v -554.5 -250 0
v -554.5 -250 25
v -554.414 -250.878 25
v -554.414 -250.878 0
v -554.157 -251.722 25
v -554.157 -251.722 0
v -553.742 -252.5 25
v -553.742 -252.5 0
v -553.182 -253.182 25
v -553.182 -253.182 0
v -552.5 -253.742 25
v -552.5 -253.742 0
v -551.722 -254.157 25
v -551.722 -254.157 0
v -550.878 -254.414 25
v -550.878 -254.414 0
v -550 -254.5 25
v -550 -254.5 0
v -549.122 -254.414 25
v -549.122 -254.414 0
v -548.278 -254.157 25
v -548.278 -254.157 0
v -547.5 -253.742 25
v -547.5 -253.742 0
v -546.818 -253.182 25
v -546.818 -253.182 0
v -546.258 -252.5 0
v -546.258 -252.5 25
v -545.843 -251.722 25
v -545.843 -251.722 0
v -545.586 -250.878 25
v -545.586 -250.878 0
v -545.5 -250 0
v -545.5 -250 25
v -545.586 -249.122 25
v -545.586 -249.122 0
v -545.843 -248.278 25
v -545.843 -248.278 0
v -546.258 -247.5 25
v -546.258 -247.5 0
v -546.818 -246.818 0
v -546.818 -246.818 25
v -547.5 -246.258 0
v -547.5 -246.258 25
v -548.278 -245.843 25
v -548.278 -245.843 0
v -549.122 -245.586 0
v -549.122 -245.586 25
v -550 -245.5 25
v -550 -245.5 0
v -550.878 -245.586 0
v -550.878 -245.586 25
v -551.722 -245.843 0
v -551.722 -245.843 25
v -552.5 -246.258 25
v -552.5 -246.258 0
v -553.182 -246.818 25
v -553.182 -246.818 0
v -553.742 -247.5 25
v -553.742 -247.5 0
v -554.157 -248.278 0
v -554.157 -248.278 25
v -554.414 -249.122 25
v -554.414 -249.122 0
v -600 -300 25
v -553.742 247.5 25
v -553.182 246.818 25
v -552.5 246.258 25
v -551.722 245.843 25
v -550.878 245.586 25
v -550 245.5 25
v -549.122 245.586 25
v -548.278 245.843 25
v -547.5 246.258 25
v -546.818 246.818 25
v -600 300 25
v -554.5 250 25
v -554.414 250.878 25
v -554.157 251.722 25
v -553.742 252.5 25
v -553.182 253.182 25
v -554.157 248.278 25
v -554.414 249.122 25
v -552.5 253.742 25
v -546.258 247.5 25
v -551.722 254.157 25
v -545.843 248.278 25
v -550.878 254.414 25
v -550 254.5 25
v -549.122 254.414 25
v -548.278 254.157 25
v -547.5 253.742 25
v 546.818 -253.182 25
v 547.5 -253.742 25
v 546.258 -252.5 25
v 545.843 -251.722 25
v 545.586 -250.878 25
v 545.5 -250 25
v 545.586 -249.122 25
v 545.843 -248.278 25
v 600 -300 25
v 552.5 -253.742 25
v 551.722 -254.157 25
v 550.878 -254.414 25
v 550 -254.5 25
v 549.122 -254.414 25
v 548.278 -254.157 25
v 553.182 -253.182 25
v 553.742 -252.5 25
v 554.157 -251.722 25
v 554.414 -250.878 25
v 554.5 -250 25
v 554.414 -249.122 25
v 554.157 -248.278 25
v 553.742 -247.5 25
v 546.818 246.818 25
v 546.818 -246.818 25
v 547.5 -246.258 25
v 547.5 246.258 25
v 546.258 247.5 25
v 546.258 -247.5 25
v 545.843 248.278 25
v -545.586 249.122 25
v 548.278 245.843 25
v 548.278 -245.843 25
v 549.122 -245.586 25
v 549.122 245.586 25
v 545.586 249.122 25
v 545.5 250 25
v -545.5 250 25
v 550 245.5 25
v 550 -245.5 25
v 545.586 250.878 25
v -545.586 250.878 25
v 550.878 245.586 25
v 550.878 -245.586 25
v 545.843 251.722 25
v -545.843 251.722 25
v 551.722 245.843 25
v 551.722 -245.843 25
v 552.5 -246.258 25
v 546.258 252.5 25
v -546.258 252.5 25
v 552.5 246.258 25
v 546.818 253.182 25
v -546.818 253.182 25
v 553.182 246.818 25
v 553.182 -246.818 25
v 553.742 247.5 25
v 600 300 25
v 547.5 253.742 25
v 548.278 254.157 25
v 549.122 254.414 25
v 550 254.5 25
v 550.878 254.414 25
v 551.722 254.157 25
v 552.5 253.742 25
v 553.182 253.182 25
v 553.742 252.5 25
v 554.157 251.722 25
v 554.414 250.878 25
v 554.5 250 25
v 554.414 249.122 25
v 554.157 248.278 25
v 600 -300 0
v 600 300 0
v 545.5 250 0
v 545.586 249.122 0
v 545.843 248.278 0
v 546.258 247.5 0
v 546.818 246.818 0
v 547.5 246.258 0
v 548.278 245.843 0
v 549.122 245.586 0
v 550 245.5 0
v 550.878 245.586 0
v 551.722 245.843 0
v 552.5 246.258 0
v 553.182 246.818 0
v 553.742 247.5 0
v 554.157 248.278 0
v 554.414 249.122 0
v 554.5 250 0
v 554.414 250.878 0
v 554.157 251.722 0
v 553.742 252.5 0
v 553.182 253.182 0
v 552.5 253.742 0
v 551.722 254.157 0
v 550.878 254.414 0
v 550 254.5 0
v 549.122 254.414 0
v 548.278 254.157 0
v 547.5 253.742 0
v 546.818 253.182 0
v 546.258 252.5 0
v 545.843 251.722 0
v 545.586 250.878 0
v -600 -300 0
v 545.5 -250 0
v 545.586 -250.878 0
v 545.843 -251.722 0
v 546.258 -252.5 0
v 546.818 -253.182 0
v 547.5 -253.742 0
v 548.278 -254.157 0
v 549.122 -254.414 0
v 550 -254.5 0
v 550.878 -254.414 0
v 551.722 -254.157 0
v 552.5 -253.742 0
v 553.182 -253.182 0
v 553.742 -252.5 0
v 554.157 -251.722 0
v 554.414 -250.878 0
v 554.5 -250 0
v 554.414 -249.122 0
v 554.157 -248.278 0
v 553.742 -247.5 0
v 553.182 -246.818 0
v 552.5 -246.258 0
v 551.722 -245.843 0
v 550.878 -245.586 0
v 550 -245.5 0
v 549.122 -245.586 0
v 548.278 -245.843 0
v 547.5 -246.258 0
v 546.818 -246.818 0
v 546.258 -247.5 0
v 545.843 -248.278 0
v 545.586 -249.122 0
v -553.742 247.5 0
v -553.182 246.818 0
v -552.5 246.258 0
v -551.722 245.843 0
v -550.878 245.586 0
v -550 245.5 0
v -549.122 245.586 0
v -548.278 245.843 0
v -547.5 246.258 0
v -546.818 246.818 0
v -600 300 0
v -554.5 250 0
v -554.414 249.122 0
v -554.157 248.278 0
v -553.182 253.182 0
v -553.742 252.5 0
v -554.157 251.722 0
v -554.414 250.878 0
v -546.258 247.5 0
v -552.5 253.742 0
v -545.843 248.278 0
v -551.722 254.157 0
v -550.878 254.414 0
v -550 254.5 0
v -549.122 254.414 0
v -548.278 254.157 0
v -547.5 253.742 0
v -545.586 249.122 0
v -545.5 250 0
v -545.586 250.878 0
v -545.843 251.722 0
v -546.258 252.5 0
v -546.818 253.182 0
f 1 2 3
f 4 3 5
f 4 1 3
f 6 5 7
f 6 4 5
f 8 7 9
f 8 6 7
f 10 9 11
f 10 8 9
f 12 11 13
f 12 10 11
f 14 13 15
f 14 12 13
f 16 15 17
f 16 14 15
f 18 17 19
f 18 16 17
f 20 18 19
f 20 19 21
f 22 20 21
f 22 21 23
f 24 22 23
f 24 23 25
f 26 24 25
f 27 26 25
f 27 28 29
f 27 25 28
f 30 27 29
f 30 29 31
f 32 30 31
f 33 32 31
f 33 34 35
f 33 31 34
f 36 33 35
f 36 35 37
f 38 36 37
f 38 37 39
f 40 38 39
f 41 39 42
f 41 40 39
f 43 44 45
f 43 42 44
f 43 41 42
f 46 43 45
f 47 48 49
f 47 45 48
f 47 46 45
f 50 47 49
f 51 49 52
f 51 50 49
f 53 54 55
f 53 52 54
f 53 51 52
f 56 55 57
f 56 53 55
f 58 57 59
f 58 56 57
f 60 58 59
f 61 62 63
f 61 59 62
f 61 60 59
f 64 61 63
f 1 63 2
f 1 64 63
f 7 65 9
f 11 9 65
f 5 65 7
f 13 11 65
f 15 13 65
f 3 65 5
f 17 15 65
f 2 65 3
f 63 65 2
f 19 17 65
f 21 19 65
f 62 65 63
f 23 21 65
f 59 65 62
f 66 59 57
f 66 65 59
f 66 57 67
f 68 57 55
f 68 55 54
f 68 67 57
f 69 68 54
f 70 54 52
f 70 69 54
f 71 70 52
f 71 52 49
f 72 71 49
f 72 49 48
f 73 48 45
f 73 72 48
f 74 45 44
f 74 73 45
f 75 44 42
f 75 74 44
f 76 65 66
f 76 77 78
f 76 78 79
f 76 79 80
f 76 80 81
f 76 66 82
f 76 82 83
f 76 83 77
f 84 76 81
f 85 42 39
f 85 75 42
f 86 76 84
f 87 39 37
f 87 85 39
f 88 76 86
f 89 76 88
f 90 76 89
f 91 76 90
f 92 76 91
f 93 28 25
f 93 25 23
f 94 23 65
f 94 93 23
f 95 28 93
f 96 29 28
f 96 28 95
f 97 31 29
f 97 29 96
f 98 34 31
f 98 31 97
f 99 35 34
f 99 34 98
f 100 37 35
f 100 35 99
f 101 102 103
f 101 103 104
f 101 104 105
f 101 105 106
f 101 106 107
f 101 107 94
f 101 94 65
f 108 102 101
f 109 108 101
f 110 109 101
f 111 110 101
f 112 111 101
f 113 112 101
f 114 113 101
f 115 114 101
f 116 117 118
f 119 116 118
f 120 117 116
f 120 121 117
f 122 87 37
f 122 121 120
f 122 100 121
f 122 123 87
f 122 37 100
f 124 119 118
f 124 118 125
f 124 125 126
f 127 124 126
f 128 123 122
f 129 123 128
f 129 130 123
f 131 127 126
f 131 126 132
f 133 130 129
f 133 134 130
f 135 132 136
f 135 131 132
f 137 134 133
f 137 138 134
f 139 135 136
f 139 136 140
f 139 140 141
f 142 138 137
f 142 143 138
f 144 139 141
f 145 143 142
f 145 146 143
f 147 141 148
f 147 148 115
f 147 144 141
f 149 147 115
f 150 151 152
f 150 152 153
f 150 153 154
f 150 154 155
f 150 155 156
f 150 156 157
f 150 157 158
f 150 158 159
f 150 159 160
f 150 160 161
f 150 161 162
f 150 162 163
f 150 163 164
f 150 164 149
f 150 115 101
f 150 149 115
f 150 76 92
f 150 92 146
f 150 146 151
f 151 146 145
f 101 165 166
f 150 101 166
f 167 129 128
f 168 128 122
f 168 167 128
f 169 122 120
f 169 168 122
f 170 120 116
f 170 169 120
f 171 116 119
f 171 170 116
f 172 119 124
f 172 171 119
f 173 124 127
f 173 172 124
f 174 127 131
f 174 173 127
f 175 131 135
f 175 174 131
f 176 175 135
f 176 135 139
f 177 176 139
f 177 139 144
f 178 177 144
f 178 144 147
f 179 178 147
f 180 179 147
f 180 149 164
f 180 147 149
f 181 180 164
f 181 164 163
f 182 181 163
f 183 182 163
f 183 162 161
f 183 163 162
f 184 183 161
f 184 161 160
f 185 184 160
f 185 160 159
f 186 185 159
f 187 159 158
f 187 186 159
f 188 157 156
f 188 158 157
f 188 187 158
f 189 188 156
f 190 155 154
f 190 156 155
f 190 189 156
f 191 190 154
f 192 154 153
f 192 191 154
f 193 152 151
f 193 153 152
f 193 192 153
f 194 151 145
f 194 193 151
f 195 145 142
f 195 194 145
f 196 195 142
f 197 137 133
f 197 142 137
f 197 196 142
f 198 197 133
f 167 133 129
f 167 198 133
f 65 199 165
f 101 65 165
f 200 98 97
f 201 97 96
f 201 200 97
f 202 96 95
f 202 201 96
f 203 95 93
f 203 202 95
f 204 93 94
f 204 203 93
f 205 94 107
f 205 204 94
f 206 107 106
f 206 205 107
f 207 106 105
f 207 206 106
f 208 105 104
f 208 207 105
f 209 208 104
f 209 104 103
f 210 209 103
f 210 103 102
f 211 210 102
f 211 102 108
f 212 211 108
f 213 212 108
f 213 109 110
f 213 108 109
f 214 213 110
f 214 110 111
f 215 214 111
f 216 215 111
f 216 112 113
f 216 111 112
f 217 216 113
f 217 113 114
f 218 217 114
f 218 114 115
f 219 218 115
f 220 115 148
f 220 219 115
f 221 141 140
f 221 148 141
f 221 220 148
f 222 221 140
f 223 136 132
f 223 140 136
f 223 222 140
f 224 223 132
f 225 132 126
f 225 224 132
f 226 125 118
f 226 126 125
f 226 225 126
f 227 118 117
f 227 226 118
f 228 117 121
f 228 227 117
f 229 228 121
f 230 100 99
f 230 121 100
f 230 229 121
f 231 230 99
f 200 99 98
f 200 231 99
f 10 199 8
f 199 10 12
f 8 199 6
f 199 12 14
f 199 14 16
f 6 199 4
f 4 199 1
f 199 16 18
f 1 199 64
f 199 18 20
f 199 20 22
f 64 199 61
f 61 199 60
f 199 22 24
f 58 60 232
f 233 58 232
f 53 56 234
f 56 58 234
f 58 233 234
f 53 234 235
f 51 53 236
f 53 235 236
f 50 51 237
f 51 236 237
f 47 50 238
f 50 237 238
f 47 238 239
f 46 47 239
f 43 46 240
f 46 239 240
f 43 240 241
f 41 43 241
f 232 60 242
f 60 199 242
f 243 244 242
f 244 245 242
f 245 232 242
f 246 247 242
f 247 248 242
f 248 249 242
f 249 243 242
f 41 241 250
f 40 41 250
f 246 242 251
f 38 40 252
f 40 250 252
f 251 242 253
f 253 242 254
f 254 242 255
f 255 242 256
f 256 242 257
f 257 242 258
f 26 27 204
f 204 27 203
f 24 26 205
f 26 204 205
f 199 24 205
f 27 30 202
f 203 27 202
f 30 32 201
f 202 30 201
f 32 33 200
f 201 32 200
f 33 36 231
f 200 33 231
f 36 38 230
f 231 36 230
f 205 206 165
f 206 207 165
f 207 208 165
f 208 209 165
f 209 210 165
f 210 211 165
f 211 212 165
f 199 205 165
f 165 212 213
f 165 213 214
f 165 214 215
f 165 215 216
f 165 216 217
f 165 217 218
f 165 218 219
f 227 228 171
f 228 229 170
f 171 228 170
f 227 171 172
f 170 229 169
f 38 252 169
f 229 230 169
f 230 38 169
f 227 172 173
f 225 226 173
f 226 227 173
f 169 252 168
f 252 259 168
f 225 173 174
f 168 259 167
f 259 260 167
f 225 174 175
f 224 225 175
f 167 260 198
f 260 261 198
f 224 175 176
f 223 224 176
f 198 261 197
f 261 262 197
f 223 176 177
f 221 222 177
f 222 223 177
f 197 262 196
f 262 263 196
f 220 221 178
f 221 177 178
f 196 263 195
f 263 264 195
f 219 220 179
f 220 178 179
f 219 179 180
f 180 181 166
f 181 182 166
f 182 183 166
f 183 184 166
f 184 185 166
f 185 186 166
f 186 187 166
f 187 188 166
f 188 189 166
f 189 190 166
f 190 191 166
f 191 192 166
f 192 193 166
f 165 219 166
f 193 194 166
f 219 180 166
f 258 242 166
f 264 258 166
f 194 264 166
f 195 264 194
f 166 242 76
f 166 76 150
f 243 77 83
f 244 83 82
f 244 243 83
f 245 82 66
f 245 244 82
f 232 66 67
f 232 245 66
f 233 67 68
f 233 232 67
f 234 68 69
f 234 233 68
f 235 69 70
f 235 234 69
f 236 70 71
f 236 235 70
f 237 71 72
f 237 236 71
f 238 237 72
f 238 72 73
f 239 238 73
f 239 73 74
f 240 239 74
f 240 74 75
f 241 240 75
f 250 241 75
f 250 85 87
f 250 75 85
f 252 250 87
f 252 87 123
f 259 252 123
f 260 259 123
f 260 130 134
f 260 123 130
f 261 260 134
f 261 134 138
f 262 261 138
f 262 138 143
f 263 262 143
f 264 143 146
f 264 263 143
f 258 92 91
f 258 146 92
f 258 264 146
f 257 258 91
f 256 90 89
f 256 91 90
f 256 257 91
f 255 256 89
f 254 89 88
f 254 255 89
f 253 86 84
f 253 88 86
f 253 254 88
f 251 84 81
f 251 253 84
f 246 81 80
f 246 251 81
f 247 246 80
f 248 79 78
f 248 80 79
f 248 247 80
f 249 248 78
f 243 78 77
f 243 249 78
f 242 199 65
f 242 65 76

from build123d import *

# Parameters (mm, degrees)
SKETCH1_W           = 1200
SKETCH1_H           = 600
BOSS_EXTRUDE1_DEPTH = 25
SKETCH2_R           = 4.5
CUT_EXTRUDE1_DEPTH  = 26
SKETCH3_R           = 4.5
CUT_EXTRUDE2_DEPTH  = 26
SKETCH4_R           = 4.5
CUT_EXTRUDE3_DEPTH  = 26
SKETCH5_R           = 4.5
CUT_EXTRUDE4_DEPTH  = 26


with BuildPart() as part:
    # Sketch1 → Boss-Extrude1 (new body)
    with BuildSketch(Plane.XY):
        Rectangle(SKETCH1_W, SKETCH1_H)
    extrude(amount=BOSS_EXTRUDE1_DEPTH)

    # Sketch2 → Cut-Extrude1 (cut)
    with BuildSketch(Plane.XY):
        with Locations((-550, -250)):
            Circle(SKETCH2_R)
    extrude(amount=CUT_EXTRUDE1_DEPTH, mode=Mode.SUBTRACT)

    # Sketch3 → Cut-Extrude2 (cut)
    with BuildSketch(Plane.XY):
        with Locations((550, -250)):
            Circle(SKETCH3_R)
    extrude(amount=CUT_EXTRUDE2_DEPTH, mode=Mode.SUBTRACT)

    # Sketch4 → Cut-Extrude3 (cut)
    with BuildSketch(Plane.XY):
        with Locations((-550, 250)):
            Circle(SKETCH4_R)
    extrude(amount=CUT_EXTRUDE3_DEPTH, mode=Mode.SUBTRACT)

    # Sketch5 → Cut-Extrude4 (cut)
    with BuildSketch(Plane.XY):
        with Locations((550, 250)):
            Circle(SKETCH5_R)
    extrude(amount=CUT_EXTRUDE4_DEPTH, mode=Mode.SUBTRACT)


solid = part.part
